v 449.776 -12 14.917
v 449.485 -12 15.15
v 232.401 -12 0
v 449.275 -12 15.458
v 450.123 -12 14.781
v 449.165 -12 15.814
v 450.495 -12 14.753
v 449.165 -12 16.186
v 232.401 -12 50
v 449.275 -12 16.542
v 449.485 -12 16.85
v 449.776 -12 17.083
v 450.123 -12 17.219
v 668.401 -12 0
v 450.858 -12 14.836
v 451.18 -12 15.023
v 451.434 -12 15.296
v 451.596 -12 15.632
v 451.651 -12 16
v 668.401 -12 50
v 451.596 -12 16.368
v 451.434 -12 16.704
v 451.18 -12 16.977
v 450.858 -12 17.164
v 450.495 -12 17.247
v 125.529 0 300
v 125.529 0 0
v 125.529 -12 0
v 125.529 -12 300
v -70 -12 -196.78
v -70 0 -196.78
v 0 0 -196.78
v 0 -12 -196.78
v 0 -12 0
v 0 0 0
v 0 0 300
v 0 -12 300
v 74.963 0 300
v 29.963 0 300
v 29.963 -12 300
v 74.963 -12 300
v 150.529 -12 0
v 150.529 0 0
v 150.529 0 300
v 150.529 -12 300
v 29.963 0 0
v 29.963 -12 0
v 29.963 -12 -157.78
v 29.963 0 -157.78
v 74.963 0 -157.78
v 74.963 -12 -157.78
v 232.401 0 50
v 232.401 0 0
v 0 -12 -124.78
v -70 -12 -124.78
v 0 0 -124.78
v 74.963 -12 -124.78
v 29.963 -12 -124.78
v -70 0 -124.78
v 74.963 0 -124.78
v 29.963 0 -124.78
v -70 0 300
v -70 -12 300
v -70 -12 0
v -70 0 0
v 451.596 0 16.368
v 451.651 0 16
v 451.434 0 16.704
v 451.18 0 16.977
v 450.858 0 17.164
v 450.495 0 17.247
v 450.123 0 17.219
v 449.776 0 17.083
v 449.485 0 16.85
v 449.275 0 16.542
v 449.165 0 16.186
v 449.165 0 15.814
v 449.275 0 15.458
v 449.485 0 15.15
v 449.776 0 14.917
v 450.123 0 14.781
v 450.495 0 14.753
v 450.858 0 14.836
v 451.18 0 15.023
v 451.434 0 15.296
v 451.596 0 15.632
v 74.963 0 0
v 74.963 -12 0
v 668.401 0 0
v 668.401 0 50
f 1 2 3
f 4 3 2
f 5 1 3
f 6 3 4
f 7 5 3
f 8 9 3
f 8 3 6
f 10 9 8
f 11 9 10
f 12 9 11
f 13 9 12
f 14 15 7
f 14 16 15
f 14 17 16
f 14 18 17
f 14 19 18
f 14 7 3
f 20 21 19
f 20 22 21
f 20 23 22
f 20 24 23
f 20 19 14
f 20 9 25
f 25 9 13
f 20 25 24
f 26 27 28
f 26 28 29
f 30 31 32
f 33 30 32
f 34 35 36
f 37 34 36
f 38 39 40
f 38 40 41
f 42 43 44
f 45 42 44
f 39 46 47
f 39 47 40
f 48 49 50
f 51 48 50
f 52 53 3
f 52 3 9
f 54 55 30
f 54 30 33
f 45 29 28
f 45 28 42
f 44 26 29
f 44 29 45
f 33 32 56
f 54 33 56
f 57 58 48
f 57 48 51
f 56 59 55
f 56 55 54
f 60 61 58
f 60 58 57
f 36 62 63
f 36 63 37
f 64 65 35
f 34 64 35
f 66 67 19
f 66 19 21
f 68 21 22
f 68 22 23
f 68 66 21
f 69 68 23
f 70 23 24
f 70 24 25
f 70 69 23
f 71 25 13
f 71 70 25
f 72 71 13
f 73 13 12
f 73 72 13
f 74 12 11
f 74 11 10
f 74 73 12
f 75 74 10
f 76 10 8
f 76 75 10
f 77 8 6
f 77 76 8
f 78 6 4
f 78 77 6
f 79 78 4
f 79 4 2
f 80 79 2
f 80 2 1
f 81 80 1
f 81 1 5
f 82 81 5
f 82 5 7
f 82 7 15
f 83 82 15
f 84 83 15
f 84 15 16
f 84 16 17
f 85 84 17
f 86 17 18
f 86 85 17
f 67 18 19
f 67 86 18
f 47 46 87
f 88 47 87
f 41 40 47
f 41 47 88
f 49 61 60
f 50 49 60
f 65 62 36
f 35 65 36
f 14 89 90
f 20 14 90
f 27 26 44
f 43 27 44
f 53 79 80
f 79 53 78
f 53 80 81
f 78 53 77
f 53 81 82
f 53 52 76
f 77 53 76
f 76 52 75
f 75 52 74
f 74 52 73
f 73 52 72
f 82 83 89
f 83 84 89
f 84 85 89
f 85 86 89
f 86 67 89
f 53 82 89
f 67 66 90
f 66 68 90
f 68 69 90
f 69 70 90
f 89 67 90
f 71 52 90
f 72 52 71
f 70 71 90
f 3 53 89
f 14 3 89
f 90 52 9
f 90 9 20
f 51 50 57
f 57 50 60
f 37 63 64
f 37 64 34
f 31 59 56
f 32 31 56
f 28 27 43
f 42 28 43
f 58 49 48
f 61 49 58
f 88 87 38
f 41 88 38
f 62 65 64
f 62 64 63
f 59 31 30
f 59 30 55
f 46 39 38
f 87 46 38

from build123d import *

# Parameters (mm, degrees)
F0_W     = 70
F0_H     = 300
F0_W_2   = 45
F0_W_3   = 25
F0_W_4   = 436
F0_H_2   = 50
F0_R     = 1.25
F0_H_3   = 72
F0_H_4   = 33
F1_DEPTH = 12


with BuildPart() as f1:
    # F0 (on Front) → F1 (new body)
    with BuildSketch(Plane.XZ):
        with Locations((-35, 150)):
            Rectangle(F0_W, F0_H)
        with Locations((52.462726, 150)):
            Rectangle(F0_W_2, F0_H)
        with Locations((138.028529, 150)):
            Rectangle(F0_W_3, F0_H)
        with Locations((450.401127, 25)):
            Rectangle(F0_W_4, F0_H_2)
        with Locations((450.401127, 16)):
            Circle(F0_R, mode=Mode.SUBTRACT)
        with Locations((-35, -160.780145)):
            Rectangle(F0_W, F0_H_3)
        with Locations((52.462726, -141.280145)):
            Rectangle(F0_W_2, F0_H_4)
    extrude(amount=F1_DEPTH)


solid = f1.part
